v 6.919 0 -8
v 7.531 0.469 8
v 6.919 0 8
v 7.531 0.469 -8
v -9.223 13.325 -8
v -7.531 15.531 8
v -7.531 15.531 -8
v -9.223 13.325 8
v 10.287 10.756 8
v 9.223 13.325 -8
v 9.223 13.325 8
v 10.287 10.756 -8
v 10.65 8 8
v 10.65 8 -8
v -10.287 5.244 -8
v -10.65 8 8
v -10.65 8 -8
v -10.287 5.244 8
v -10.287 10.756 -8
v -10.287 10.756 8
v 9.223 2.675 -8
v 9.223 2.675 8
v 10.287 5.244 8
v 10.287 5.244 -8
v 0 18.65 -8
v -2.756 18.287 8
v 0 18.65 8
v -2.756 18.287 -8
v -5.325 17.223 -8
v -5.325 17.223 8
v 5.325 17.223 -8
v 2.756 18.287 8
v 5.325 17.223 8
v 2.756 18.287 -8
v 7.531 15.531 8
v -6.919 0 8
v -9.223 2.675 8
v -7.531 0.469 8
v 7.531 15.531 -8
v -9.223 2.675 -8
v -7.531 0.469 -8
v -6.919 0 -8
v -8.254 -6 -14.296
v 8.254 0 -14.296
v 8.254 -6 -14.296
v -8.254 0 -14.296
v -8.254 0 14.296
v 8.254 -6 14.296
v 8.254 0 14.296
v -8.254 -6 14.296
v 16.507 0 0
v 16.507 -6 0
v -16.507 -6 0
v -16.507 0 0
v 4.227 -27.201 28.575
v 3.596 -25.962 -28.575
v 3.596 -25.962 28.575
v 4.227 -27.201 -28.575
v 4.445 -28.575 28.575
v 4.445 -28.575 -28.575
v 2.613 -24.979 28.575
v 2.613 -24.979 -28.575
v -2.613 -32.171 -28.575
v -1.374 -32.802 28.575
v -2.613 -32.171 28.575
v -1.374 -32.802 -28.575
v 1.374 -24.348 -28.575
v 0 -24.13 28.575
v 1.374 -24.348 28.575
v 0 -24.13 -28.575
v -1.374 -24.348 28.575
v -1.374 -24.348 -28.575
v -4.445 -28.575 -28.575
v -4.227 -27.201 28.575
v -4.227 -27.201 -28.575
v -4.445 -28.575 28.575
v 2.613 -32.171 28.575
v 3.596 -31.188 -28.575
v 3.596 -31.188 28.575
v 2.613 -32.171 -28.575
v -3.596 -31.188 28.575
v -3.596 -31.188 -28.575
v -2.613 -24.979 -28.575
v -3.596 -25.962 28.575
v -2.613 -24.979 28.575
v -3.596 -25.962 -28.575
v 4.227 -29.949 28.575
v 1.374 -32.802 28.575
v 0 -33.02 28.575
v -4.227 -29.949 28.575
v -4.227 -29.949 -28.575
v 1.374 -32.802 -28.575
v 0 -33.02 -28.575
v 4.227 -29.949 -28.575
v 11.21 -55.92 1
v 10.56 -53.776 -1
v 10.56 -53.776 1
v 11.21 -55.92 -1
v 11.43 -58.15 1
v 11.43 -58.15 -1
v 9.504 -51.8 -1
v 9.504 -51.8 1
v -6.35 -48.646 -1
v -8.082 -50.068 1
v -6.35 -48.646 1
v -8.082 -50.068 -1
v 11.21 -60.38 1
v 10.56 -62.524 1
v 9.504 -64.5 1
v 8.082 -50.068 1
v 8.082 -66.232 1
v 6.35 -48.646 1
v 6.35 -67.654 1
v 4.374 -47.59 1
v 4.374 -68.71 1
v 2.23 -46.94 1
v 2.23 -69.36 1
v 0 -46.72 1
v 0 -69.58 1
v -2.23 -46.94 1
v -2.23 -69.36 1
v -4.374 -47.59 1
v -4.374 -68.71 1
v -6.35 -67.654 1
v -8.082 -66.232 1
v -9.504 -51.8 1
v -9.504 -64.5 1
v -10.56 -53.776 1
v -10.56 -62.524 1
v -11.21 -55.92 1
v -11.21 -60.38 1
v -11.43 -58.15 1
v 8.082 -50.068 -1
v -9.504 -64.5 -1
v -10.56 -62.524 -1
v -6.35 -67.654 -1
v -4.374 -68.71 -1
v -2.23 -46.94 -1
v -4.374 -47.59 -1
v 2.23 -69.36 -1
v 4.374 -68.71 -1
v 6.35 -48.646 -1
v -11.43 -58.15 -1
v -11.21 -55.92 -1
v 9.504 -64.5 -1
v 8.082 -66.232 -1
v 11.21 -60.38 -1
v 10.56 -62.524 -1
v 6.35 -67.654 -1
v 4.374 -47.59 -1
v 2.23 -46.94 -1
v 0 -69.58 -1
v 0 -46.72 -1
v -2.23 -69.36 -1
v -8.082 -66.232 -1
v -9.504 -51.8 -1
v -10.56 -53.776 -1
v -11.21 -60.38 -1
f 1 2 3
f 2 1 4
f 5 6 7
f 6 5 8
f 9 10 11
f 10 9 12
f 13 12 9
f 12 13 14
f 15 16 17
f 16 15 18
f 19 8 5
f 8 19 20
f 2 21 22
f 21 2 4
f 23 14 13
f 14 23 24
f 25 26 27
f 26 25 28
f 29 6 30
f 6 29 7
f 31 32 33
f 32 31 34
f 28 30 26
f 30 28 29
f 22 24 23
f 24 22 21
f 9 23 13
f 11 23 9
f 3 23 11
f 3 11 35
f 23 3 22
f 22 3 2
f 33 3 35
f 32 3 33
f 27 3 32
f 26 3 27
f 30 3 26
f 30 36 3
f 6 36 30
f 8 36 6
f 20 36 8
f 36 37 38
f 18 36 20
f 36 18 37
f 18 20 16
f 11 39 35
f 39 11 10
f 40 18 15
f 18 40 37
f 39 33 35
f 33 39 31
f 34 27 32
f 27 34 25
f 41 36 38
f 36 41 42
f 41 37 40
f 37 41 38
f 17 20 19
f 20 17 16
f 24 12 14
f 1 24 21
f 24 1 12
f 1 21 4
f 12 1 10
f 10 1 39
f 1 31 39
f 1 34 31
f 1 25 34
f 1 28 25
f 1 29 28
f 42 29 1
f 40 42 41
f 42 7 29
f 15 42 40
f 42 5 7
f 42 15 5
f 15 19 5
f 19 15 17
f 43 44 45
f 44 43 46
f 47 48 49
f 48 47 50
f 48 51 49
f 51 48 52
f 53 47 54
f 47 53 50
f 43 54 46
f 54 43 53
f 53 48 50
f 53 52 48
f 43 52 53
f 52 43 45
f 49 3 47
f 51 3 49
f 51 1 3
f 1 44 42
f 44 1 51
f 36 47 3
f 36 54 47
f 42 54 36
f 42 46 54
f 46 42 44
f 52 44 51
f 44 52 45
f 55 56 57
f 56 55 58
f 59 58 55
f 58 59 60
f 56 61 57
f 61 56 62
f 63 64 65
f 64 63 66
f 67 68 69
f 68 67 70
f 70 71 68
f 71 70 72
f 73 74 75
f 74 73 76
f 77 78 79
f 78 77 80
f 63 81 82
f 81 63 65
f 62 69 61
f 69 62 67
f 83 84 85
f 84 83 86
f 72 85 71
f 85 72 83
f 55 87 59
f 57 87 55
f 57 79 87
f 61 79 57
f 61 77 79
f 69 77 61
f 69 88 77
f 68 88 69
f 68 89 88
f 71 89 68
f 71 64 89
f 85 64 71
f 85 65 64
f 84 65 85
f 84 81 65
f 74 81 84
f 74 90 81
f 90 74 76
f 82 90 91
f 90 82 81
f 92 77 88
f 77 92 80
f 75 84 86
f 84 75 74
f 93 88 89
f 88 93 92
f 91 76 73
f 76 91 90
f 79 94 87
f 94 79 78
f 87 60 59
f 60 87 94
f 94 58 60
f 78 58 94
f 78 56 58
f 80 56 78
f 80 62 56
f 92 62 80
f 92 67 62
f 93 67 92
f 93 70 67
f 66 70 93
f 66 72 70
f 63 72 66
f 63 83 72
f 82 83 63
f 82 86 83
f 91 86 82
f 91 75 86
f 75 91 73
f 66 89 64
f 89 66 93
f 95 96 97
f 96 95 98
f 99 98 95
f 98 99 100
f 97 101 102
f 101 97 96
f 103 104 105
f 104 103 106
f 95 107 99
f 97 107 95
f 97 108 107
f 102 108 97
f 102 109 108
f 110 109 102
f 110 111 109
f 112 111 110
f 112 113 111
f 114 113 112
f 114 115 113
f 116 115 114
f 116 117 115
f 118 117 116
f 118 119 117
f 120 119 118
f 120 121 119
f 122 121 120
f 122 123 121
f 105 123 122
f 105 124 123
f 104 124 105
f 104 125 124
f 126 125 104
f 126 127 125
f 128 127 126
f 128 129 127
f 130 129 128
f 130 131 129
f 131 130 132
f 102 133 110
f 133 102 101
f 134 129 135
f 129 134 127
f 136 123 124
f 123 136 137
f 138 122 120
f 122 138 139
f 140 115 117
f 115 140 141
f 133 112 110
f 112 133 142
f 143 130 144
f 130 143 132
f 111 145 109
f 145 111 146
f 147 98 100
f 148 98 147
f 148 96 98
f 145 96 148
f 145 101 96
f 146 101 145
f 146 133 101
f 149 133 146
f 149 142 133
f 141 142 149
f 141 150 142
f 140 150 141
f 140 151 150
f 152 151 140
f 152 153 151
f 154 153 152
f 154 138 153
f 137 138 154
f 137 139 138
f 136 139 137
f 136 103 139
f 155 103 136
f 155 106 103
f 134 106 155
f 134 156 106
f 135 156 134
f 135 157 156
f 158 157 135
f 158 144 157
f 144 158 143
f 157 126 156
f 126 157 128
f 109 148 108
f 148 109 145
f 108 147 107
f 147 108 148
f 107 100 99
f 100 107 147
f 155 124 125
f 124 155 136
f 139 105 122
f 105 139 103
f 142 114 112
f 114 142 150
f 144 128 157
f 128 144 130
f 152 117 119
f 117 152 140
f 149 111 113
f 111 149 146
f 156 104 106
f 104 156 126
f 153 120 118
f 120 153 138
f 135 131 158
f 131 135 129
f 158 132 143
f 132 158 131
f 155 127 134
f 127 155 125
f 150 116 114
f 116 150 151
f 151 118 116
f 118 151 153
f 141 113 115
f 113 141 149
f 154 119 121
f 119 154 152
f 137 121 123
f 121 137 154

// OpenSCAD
// Auto-generated by scripts/author_from_manifest.py (Phase D.3).
// Source: data/phase_d_manifest.json (sku_intent='viking-vk300-qr-pendent-175f').
// Do not hand-edit — regenerate from the manifest.
//
// @part viking_vk300_qr_pendent_175f
// @kind sprinkler_head
// @category head.pendant.k56
// @display-name "Viking VK300 Quick-Response Pendent K5.6 175°F"
// @mfg viking_group
// @mfg-pn VK300
// @listing UL FM
// @hazard-classes LH OH1
// @price-usd 14.50
// @install-minutes 8
// @crew journeyman
// @k-factor 5.6
// @orientation pendant
// @response quick
// @temperature 175F
// @param size_in number default=0.5 label="Size" unit="in"
// @port inlet position=[0,0.014,0] direction=[0,1,0] style=NPT_threaded size_in=0.5 role=drop

size_in = 0.5;
k_factor = 5.6;

length_mm   = 57.15;
body_dia_mm = 25.40;
thread_od   = 21.3;
thread_len  = 16;
deflector_d = body_dia_mm * 0.9;

 union() {
    translate([0, thread_len/2, 0])
        cylinder(h = thread_len, d = thread_od, center = true, $fn = 24);
    translate([0, -3, 0])
        rotate([90, 0, 0])
        cylinder(h = 6, d = thread_od * 1.55, $fn = 6, center = true);
    translate([0, -length_mm/2, 0])
        cylinder(h = length_mm, d = body_dia_mm * 0.35, center = true, $fn = 20);
    translate([0, -length_mm - 1, 0])
        cylinder(h = 2, d = deflector_d, center = true, $fn = 32);
}
